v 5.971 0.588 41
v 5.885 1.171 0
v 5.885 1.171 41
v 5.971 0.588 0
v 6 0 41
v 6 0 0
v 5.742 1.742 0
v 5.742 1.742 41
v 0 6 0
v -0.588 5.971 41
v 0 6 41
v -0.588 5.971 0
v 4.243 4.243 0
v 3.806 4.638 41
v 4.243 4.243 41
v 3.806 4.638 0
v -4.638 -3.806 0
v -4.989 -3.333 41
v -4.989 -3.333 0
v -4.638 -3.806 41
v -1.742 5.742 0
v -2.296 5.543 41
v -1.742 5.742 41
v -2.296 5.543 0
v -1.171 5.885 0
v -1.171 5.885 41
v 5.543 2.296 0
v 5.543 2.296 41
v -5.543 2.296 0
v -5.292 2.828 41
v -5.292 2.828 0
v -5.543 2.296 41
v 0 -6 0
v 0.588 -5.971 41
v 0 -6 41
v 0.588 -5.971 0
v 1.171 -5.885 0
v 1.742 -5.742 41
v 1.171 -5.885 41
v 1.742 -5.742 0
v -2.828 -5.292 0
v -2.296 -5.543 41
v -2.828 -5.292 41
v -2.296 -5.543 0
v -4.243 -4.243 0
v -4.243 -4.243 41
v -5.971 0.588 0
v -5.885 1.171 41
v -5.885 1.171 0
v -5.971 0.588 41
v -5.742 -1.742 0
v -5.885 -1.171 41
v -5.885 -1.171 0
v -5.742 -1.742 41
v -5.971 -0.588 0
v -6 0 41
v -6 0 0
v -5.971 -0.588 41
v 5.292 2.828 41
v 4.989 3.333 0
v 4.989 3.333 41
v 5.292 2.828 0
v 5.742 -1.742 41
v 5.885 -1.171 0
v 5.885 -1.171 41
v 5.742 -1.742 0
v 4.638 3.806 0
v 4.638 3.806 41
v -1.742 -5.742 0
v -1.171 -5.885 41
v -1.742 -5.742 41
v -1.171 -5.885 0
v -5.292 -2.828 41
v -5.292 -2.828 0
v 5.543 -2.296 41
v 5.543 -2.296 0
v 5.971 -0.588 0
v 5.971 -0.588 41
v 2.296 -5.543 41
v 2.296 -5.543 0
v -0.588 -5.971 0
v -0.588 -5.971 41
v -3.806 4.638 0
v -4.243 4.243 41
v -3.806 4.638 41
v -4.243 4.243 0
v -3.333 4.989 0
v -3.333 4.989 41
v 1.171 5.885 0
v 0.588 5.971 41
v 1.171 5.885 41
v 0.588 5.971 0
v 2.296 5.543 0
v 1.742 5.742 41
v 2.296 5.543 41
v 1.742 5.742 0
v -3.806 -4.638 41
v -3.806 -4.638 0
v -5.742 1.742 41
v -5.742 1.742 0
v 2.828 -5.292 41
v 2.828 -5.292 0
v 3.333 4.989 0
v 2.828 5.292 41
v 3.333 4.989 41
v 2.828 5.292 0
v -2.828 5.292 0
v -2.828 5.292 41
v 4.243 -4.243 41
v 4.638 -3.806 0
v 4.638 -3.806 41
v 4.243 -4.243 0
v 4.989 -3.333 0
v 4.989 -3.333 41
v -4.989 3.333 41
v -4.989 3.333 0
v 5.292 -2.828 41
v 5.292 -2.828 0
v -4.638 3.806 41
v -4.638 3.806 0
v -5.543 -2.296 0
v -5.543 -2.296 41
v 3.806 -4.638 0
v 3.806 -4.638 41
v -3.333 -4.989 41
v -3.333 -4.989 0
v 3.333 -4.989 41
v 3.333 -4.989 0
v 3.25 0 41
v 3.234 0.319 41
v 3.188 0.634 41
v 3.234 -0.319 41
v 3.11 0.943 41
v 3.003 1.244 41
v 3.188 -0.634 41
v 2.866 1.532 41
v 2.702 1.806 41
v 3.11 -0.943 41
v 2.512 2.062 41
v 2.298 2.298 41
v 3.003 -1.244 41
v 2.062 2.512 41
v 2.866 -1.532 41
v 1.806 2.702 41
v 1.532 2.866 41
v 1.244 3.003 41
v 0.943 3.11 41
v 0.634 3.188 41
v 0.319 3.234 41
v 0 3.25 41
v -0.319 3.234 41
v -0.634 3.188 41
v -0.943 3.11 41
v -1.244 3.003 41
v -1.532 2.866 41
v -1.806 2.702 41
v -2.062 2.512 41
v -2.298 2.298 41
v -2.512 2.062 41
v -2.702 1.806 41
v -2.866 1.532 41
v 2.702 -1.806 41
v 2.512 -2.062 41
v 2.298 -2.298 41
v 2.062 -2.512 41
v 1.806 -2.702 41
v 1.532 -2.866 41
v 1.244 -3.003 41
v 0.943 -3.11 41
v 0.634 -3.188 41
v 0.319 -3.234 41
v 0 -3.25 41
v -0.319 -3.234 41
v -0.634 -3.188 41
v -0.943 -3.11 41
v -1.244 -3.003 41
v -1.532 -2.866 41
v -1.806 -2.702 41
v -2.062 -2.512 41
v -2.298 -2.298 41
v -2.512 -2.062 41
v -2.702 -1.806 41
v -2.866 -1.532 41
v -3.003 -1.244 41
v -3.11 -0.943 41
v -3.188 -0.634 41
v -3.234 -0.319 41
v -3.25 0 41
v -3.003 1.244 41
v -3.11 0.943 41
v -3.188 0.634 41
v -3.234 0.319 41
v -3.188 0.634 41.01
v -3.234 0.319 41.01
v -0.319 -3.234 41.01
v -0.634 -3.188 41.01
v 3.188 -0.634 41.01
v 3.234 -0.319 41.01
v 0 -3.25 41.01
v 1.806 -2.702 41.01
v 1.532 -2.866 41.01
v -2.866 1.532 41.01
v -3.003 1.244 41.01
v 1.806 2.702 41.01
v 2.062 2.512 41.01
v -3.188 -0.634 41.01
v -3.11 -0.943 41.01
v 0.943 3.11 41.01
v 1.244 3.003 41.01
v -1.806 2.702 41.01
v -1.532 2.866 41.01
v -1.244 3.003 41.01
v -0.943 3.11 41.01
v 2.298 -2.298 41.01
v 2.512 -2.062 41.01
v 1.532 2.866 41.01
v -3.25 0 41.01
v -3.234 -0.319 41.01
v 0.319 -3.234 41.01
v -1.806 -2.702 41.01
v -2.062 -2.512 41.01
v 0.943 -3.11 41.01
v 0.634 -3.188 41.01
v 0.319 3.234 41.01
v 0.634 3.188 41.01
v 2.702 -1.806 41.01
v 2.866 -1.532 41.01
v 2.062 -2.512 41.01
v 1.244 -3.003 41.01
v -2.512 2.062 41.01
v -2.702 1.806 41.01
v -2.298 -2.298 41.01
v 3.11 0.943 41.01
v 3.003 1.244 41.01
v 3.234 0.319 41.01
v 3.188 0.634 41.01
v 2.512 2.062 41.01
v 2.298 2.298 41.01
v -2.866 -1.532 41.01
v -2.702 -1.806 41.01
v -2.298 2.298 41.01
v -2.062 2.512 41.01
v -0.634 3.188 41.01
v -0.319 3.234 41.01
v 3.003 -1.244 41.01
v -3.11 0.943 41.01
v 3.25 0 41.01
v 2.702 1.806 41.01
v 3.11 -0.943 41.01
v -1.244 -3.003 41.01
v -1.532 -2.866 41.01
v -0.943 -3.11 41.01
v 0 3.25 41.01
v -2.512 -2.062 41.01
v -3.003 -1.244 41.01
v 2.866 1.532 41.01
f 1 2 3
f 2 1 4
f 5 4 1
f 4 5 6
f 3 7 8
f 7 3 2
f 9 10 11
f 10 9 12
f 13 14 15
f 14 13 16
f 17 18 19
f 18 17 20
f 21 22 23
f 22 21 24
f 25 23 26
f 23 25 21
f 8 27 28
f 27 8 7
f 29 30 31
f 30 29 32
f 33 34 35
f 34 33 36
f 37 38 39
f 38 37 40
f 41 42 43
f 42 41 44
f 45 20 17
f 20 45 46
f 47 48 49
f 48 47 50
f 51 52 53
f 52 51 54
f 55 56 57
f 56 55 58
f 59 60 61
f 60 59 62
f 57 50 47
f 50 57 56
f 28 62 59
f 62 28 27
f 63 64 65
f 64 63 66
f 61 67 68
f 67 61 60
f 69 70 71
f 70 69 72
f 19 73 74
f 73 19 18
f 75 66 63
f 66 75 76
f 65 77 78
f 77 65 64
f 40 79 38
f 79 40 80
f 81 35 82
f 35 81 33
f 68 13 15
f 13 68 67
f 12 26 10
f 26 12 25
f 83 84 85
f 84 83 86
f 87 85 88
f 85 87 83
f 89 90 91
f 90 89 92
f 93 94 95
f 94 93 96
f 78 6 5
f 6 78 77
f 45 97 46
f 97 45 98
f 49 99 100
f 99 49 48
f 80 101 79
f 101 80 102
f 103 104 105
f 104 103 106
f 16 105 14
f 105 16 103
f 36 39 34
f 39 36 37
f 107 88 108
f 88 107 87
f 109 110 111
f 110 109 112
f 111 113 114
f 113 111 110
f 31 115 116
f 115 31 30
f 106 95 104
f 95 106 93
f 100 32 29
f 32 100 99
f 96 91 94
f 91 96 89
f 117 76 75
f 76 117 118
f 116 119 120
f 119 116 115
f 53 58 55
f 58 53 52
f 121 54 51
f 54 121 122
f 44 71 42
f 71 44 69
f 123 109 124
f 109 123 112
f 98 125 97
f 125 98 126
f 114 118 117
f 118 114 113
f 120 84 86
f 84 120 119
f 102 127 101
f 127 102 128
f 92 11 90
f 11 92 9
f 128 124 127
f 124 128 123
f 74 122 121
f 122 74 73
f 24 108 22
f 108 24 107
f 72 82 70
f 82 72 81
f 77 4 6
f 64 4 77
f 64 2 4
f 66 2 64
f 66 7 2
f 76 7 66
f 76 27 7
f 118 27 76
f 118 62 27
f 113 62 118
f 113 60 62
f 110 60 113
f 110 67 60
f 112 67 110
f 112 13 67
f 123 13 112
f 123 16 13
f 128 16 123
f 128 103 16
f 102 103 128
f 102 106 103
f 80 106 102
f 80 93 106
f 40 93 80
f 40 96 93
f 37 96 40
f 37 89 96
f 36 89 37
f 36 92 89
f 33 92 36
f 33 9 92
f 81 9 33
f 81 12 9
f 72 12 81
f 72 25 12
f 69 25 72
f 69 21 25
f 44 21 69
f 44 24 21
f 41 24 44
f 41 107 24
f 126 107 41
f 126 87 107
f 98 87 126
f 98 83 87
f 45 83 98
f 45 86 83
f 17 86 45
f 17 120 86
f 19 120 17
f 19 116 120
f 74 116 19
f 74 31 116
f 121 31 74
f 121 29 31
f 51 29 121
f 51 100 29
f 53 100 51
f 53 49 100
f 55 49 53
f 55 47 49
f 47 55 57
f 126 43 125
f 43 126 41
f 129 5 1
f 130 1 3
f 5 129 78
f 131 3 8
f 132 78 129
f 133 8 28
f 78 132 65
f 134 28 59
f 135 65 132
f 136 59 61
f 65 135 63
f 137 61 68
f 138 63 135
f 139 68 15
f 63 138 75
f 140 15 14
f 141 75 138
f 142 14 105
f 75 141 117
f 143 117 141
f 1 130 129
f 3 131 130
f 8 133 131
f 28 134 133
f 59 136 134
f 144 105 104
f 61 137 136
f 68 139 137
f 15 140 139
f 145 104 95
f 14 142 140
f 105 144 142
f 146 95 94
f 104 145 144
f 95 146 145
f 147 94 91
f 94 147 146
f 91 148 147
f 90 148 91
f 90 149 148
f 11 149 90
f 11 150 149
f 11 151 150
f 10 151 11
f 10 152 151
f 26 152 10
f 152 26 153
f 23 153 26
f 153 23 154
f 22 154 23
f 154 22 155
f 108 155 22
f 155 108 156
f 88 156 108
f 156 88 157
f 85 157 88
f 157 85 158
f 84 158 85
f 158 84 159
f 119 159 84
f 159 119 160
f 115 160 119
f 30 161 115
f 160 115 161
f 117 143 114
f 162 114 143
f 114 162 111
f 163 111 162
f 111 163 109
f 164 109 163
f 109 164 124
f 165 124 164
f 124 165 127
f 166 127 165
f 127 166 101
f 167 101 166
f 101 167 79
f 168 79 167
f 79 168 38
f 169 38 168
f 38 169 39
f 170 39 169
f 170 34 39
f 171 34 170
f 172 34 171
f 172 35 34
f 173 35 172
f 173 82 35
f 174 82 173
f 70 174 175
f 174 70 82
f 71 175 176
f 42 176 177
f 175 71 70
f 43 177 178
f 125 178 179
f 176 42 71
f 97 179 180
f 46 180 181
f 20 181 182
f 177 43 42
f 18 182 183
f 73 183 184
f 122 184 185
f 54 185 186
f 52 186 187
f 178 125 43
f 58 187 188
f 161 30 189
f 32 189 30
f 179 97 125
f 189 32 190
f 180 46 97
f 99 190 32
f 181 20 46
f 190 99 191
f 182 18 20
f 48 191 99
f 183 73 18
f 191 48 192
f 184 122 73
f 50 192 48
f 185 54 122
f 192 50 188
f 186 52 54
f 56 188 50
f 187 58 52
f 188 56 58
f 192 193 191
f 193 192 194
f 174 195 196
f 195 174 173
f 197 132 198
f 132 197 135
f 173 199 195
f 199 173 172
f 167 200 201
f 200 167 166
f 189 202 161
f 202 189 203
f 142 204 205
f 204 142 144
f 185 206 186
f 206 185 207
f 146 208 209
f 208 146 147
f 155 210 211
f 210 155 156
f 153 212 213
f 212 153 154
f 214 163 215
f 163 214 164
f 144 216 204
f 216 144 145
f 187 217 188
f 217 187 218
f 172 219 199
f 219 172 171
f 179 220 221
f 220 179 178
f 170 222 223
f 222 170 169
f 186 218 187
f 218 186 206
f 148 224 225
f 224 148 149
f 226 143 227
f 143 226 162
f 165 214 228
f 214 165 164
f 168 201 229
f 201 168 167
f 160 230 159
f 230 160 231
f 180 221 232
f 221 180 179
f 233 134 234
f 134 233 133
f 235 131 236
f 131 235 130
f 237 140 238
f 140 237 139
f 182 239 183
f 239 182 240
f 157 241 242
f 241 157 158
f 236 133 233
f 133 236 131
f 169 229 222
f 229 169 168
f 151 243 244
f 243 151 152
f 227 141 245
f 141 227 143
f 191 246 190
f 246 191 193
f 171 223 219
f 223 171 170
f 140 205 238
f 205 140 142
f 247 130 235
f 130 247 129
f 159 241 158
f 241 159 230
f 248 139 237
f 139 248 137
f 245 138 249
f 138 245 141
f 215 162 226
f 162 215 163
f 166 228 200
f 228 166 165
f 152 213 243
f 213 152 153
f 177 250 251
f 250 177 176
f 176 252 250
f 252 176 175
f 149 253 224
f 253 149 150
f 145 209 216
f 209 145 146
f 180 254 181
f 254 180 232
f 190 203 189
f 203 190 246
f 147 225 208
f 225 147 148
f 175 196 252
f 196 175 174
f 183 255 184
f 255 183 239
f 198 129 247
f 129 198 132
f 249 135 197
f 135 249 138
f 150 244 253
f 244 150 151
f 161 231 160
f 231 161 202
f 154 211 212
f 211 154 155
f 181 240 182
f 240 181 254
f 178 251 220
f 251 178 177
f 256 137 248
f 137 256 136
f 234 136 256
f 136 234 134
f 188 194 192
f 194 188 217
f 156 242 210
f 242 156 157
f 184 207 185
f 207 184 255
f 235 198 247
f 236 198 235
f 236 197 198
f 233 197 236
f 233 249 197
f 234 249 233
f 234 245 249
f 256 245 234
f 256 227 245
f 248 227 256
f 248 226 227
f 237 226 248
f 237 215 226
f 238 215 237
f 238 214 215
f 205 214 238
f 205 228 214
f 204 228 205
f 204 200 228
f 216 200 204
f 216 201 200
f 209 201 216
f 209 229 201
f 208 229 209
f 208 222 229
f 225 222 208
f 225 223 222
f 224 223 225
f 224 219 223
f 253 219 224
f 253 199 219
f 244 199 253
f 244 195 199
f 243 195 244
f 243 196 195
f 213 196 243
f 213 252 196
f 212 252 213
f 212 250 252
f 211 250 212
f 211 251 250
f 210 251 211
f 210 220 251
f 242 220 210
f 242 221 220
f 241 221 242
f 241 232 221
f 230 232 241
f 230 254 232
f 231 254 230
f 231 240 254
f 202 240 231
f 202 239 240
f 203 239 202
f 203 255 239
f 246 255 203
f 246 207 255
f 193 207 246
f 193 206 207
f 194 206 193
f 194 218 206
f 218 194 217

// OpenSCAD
$fn = 64;

// Dimensions
bore_diameter = 3;
main_body_diameter = 12;
collar_diameter = 12;
collar_height = 5;
barb8_height = 10;
barb8_bottom_diameter = 7.5;
barb8_top_diameter = 9.5;
barb5_height = 8;
barb5_bottom_diameter = 6.5;
barb5_top_diameter = 5.0;
total_height = 41;

// Helper function to create a single sawtooth barb (3D only)
module sawtooth_barb_3d(bottom_diameter, top_diameter, height, z_offset) {
    half_height = height / 2;
    
    // Create the sawtooth profile using hull for the step transition
    // First ramp: bottom to top
    hull() {
        translate([0, 0, z_offset])
            cylinder(d = bottom_diameter, h = 0.01, $fn = 64);
        translate([0, 0, z_offset + half_height])
            cylinder(d = top_diameter, h = 0.01, $fn = 64);
    }
    
    // Step back: top to bottom
    hull() {
        translate([0, 0, z_offset + half_height])
            cylinder(d = top_diameter, h = 0.01, $fn = 64);
        translate([0, 0, z_offset + height])
            cylinder(d = bottom_diameter, h = 0.01, $fn = 64);
    }
}

// Main body with bore
module main_body_with_bore() {
    // Base cylinder (from z=0 to z=20)
    difference() {
        cylinder(h = 20, d = main_body_diameter, $fn = 64);
        translate([0, 0, -0.01])
            cylinder(h = 20.02, d = bore_diameter, $fn = 64);
    }
    
    // Collar section (z=20 to z=25)
    translate([0, 0, 20])
        cylinder(h = collar_height, d = collar_diameter, $fn = 64);
    
    // Top section (z=25 to z=41)
    translate([0, 0, 25])
        cylinder(h = 16, d = main_body_diameter, $fn = 64);
}

// 8mm barbs (z=0 to z=20)
module barbs_8mm() {
    // First barb (bottom)
    translate([0, 0, 0])
        sawtooth_barb_3d(barb8_bottom_diameter, barb8_top_diameter, barb8_height, 0);
    
    // Second barb (top)
    translate([0, 0, barb8_height])
        sawtooth_barb_3d(barb8_bottom_diameter, barb8_top_diameter, barb8_height, 0);
}

// 5mm barbs (z=25 to z=41)
module barbs_5mm() {
    // First barb (bottom)
    translate([0, 0, 25])
        sawtooth_barb_3d(barb5_bottom_diameter, barb5_top_diameter, barb5_height, 0);
    
    // Second barb (top)
    translate([0, 0, 25 + barb5_height])
        sawtooth_barb_3d(barb5_bottom_diameter, barb5_top_diameter, barb5_height, 0);
}

// Combine everything with proper union
module reducer() {
    // Start with main body
    main_body_with_bore();
    
    // Add 8mm barbs
    barbs_8mm();
    
    // Add 5mm barbs
    barbs_5mm();
}

// Final part
reducer();
